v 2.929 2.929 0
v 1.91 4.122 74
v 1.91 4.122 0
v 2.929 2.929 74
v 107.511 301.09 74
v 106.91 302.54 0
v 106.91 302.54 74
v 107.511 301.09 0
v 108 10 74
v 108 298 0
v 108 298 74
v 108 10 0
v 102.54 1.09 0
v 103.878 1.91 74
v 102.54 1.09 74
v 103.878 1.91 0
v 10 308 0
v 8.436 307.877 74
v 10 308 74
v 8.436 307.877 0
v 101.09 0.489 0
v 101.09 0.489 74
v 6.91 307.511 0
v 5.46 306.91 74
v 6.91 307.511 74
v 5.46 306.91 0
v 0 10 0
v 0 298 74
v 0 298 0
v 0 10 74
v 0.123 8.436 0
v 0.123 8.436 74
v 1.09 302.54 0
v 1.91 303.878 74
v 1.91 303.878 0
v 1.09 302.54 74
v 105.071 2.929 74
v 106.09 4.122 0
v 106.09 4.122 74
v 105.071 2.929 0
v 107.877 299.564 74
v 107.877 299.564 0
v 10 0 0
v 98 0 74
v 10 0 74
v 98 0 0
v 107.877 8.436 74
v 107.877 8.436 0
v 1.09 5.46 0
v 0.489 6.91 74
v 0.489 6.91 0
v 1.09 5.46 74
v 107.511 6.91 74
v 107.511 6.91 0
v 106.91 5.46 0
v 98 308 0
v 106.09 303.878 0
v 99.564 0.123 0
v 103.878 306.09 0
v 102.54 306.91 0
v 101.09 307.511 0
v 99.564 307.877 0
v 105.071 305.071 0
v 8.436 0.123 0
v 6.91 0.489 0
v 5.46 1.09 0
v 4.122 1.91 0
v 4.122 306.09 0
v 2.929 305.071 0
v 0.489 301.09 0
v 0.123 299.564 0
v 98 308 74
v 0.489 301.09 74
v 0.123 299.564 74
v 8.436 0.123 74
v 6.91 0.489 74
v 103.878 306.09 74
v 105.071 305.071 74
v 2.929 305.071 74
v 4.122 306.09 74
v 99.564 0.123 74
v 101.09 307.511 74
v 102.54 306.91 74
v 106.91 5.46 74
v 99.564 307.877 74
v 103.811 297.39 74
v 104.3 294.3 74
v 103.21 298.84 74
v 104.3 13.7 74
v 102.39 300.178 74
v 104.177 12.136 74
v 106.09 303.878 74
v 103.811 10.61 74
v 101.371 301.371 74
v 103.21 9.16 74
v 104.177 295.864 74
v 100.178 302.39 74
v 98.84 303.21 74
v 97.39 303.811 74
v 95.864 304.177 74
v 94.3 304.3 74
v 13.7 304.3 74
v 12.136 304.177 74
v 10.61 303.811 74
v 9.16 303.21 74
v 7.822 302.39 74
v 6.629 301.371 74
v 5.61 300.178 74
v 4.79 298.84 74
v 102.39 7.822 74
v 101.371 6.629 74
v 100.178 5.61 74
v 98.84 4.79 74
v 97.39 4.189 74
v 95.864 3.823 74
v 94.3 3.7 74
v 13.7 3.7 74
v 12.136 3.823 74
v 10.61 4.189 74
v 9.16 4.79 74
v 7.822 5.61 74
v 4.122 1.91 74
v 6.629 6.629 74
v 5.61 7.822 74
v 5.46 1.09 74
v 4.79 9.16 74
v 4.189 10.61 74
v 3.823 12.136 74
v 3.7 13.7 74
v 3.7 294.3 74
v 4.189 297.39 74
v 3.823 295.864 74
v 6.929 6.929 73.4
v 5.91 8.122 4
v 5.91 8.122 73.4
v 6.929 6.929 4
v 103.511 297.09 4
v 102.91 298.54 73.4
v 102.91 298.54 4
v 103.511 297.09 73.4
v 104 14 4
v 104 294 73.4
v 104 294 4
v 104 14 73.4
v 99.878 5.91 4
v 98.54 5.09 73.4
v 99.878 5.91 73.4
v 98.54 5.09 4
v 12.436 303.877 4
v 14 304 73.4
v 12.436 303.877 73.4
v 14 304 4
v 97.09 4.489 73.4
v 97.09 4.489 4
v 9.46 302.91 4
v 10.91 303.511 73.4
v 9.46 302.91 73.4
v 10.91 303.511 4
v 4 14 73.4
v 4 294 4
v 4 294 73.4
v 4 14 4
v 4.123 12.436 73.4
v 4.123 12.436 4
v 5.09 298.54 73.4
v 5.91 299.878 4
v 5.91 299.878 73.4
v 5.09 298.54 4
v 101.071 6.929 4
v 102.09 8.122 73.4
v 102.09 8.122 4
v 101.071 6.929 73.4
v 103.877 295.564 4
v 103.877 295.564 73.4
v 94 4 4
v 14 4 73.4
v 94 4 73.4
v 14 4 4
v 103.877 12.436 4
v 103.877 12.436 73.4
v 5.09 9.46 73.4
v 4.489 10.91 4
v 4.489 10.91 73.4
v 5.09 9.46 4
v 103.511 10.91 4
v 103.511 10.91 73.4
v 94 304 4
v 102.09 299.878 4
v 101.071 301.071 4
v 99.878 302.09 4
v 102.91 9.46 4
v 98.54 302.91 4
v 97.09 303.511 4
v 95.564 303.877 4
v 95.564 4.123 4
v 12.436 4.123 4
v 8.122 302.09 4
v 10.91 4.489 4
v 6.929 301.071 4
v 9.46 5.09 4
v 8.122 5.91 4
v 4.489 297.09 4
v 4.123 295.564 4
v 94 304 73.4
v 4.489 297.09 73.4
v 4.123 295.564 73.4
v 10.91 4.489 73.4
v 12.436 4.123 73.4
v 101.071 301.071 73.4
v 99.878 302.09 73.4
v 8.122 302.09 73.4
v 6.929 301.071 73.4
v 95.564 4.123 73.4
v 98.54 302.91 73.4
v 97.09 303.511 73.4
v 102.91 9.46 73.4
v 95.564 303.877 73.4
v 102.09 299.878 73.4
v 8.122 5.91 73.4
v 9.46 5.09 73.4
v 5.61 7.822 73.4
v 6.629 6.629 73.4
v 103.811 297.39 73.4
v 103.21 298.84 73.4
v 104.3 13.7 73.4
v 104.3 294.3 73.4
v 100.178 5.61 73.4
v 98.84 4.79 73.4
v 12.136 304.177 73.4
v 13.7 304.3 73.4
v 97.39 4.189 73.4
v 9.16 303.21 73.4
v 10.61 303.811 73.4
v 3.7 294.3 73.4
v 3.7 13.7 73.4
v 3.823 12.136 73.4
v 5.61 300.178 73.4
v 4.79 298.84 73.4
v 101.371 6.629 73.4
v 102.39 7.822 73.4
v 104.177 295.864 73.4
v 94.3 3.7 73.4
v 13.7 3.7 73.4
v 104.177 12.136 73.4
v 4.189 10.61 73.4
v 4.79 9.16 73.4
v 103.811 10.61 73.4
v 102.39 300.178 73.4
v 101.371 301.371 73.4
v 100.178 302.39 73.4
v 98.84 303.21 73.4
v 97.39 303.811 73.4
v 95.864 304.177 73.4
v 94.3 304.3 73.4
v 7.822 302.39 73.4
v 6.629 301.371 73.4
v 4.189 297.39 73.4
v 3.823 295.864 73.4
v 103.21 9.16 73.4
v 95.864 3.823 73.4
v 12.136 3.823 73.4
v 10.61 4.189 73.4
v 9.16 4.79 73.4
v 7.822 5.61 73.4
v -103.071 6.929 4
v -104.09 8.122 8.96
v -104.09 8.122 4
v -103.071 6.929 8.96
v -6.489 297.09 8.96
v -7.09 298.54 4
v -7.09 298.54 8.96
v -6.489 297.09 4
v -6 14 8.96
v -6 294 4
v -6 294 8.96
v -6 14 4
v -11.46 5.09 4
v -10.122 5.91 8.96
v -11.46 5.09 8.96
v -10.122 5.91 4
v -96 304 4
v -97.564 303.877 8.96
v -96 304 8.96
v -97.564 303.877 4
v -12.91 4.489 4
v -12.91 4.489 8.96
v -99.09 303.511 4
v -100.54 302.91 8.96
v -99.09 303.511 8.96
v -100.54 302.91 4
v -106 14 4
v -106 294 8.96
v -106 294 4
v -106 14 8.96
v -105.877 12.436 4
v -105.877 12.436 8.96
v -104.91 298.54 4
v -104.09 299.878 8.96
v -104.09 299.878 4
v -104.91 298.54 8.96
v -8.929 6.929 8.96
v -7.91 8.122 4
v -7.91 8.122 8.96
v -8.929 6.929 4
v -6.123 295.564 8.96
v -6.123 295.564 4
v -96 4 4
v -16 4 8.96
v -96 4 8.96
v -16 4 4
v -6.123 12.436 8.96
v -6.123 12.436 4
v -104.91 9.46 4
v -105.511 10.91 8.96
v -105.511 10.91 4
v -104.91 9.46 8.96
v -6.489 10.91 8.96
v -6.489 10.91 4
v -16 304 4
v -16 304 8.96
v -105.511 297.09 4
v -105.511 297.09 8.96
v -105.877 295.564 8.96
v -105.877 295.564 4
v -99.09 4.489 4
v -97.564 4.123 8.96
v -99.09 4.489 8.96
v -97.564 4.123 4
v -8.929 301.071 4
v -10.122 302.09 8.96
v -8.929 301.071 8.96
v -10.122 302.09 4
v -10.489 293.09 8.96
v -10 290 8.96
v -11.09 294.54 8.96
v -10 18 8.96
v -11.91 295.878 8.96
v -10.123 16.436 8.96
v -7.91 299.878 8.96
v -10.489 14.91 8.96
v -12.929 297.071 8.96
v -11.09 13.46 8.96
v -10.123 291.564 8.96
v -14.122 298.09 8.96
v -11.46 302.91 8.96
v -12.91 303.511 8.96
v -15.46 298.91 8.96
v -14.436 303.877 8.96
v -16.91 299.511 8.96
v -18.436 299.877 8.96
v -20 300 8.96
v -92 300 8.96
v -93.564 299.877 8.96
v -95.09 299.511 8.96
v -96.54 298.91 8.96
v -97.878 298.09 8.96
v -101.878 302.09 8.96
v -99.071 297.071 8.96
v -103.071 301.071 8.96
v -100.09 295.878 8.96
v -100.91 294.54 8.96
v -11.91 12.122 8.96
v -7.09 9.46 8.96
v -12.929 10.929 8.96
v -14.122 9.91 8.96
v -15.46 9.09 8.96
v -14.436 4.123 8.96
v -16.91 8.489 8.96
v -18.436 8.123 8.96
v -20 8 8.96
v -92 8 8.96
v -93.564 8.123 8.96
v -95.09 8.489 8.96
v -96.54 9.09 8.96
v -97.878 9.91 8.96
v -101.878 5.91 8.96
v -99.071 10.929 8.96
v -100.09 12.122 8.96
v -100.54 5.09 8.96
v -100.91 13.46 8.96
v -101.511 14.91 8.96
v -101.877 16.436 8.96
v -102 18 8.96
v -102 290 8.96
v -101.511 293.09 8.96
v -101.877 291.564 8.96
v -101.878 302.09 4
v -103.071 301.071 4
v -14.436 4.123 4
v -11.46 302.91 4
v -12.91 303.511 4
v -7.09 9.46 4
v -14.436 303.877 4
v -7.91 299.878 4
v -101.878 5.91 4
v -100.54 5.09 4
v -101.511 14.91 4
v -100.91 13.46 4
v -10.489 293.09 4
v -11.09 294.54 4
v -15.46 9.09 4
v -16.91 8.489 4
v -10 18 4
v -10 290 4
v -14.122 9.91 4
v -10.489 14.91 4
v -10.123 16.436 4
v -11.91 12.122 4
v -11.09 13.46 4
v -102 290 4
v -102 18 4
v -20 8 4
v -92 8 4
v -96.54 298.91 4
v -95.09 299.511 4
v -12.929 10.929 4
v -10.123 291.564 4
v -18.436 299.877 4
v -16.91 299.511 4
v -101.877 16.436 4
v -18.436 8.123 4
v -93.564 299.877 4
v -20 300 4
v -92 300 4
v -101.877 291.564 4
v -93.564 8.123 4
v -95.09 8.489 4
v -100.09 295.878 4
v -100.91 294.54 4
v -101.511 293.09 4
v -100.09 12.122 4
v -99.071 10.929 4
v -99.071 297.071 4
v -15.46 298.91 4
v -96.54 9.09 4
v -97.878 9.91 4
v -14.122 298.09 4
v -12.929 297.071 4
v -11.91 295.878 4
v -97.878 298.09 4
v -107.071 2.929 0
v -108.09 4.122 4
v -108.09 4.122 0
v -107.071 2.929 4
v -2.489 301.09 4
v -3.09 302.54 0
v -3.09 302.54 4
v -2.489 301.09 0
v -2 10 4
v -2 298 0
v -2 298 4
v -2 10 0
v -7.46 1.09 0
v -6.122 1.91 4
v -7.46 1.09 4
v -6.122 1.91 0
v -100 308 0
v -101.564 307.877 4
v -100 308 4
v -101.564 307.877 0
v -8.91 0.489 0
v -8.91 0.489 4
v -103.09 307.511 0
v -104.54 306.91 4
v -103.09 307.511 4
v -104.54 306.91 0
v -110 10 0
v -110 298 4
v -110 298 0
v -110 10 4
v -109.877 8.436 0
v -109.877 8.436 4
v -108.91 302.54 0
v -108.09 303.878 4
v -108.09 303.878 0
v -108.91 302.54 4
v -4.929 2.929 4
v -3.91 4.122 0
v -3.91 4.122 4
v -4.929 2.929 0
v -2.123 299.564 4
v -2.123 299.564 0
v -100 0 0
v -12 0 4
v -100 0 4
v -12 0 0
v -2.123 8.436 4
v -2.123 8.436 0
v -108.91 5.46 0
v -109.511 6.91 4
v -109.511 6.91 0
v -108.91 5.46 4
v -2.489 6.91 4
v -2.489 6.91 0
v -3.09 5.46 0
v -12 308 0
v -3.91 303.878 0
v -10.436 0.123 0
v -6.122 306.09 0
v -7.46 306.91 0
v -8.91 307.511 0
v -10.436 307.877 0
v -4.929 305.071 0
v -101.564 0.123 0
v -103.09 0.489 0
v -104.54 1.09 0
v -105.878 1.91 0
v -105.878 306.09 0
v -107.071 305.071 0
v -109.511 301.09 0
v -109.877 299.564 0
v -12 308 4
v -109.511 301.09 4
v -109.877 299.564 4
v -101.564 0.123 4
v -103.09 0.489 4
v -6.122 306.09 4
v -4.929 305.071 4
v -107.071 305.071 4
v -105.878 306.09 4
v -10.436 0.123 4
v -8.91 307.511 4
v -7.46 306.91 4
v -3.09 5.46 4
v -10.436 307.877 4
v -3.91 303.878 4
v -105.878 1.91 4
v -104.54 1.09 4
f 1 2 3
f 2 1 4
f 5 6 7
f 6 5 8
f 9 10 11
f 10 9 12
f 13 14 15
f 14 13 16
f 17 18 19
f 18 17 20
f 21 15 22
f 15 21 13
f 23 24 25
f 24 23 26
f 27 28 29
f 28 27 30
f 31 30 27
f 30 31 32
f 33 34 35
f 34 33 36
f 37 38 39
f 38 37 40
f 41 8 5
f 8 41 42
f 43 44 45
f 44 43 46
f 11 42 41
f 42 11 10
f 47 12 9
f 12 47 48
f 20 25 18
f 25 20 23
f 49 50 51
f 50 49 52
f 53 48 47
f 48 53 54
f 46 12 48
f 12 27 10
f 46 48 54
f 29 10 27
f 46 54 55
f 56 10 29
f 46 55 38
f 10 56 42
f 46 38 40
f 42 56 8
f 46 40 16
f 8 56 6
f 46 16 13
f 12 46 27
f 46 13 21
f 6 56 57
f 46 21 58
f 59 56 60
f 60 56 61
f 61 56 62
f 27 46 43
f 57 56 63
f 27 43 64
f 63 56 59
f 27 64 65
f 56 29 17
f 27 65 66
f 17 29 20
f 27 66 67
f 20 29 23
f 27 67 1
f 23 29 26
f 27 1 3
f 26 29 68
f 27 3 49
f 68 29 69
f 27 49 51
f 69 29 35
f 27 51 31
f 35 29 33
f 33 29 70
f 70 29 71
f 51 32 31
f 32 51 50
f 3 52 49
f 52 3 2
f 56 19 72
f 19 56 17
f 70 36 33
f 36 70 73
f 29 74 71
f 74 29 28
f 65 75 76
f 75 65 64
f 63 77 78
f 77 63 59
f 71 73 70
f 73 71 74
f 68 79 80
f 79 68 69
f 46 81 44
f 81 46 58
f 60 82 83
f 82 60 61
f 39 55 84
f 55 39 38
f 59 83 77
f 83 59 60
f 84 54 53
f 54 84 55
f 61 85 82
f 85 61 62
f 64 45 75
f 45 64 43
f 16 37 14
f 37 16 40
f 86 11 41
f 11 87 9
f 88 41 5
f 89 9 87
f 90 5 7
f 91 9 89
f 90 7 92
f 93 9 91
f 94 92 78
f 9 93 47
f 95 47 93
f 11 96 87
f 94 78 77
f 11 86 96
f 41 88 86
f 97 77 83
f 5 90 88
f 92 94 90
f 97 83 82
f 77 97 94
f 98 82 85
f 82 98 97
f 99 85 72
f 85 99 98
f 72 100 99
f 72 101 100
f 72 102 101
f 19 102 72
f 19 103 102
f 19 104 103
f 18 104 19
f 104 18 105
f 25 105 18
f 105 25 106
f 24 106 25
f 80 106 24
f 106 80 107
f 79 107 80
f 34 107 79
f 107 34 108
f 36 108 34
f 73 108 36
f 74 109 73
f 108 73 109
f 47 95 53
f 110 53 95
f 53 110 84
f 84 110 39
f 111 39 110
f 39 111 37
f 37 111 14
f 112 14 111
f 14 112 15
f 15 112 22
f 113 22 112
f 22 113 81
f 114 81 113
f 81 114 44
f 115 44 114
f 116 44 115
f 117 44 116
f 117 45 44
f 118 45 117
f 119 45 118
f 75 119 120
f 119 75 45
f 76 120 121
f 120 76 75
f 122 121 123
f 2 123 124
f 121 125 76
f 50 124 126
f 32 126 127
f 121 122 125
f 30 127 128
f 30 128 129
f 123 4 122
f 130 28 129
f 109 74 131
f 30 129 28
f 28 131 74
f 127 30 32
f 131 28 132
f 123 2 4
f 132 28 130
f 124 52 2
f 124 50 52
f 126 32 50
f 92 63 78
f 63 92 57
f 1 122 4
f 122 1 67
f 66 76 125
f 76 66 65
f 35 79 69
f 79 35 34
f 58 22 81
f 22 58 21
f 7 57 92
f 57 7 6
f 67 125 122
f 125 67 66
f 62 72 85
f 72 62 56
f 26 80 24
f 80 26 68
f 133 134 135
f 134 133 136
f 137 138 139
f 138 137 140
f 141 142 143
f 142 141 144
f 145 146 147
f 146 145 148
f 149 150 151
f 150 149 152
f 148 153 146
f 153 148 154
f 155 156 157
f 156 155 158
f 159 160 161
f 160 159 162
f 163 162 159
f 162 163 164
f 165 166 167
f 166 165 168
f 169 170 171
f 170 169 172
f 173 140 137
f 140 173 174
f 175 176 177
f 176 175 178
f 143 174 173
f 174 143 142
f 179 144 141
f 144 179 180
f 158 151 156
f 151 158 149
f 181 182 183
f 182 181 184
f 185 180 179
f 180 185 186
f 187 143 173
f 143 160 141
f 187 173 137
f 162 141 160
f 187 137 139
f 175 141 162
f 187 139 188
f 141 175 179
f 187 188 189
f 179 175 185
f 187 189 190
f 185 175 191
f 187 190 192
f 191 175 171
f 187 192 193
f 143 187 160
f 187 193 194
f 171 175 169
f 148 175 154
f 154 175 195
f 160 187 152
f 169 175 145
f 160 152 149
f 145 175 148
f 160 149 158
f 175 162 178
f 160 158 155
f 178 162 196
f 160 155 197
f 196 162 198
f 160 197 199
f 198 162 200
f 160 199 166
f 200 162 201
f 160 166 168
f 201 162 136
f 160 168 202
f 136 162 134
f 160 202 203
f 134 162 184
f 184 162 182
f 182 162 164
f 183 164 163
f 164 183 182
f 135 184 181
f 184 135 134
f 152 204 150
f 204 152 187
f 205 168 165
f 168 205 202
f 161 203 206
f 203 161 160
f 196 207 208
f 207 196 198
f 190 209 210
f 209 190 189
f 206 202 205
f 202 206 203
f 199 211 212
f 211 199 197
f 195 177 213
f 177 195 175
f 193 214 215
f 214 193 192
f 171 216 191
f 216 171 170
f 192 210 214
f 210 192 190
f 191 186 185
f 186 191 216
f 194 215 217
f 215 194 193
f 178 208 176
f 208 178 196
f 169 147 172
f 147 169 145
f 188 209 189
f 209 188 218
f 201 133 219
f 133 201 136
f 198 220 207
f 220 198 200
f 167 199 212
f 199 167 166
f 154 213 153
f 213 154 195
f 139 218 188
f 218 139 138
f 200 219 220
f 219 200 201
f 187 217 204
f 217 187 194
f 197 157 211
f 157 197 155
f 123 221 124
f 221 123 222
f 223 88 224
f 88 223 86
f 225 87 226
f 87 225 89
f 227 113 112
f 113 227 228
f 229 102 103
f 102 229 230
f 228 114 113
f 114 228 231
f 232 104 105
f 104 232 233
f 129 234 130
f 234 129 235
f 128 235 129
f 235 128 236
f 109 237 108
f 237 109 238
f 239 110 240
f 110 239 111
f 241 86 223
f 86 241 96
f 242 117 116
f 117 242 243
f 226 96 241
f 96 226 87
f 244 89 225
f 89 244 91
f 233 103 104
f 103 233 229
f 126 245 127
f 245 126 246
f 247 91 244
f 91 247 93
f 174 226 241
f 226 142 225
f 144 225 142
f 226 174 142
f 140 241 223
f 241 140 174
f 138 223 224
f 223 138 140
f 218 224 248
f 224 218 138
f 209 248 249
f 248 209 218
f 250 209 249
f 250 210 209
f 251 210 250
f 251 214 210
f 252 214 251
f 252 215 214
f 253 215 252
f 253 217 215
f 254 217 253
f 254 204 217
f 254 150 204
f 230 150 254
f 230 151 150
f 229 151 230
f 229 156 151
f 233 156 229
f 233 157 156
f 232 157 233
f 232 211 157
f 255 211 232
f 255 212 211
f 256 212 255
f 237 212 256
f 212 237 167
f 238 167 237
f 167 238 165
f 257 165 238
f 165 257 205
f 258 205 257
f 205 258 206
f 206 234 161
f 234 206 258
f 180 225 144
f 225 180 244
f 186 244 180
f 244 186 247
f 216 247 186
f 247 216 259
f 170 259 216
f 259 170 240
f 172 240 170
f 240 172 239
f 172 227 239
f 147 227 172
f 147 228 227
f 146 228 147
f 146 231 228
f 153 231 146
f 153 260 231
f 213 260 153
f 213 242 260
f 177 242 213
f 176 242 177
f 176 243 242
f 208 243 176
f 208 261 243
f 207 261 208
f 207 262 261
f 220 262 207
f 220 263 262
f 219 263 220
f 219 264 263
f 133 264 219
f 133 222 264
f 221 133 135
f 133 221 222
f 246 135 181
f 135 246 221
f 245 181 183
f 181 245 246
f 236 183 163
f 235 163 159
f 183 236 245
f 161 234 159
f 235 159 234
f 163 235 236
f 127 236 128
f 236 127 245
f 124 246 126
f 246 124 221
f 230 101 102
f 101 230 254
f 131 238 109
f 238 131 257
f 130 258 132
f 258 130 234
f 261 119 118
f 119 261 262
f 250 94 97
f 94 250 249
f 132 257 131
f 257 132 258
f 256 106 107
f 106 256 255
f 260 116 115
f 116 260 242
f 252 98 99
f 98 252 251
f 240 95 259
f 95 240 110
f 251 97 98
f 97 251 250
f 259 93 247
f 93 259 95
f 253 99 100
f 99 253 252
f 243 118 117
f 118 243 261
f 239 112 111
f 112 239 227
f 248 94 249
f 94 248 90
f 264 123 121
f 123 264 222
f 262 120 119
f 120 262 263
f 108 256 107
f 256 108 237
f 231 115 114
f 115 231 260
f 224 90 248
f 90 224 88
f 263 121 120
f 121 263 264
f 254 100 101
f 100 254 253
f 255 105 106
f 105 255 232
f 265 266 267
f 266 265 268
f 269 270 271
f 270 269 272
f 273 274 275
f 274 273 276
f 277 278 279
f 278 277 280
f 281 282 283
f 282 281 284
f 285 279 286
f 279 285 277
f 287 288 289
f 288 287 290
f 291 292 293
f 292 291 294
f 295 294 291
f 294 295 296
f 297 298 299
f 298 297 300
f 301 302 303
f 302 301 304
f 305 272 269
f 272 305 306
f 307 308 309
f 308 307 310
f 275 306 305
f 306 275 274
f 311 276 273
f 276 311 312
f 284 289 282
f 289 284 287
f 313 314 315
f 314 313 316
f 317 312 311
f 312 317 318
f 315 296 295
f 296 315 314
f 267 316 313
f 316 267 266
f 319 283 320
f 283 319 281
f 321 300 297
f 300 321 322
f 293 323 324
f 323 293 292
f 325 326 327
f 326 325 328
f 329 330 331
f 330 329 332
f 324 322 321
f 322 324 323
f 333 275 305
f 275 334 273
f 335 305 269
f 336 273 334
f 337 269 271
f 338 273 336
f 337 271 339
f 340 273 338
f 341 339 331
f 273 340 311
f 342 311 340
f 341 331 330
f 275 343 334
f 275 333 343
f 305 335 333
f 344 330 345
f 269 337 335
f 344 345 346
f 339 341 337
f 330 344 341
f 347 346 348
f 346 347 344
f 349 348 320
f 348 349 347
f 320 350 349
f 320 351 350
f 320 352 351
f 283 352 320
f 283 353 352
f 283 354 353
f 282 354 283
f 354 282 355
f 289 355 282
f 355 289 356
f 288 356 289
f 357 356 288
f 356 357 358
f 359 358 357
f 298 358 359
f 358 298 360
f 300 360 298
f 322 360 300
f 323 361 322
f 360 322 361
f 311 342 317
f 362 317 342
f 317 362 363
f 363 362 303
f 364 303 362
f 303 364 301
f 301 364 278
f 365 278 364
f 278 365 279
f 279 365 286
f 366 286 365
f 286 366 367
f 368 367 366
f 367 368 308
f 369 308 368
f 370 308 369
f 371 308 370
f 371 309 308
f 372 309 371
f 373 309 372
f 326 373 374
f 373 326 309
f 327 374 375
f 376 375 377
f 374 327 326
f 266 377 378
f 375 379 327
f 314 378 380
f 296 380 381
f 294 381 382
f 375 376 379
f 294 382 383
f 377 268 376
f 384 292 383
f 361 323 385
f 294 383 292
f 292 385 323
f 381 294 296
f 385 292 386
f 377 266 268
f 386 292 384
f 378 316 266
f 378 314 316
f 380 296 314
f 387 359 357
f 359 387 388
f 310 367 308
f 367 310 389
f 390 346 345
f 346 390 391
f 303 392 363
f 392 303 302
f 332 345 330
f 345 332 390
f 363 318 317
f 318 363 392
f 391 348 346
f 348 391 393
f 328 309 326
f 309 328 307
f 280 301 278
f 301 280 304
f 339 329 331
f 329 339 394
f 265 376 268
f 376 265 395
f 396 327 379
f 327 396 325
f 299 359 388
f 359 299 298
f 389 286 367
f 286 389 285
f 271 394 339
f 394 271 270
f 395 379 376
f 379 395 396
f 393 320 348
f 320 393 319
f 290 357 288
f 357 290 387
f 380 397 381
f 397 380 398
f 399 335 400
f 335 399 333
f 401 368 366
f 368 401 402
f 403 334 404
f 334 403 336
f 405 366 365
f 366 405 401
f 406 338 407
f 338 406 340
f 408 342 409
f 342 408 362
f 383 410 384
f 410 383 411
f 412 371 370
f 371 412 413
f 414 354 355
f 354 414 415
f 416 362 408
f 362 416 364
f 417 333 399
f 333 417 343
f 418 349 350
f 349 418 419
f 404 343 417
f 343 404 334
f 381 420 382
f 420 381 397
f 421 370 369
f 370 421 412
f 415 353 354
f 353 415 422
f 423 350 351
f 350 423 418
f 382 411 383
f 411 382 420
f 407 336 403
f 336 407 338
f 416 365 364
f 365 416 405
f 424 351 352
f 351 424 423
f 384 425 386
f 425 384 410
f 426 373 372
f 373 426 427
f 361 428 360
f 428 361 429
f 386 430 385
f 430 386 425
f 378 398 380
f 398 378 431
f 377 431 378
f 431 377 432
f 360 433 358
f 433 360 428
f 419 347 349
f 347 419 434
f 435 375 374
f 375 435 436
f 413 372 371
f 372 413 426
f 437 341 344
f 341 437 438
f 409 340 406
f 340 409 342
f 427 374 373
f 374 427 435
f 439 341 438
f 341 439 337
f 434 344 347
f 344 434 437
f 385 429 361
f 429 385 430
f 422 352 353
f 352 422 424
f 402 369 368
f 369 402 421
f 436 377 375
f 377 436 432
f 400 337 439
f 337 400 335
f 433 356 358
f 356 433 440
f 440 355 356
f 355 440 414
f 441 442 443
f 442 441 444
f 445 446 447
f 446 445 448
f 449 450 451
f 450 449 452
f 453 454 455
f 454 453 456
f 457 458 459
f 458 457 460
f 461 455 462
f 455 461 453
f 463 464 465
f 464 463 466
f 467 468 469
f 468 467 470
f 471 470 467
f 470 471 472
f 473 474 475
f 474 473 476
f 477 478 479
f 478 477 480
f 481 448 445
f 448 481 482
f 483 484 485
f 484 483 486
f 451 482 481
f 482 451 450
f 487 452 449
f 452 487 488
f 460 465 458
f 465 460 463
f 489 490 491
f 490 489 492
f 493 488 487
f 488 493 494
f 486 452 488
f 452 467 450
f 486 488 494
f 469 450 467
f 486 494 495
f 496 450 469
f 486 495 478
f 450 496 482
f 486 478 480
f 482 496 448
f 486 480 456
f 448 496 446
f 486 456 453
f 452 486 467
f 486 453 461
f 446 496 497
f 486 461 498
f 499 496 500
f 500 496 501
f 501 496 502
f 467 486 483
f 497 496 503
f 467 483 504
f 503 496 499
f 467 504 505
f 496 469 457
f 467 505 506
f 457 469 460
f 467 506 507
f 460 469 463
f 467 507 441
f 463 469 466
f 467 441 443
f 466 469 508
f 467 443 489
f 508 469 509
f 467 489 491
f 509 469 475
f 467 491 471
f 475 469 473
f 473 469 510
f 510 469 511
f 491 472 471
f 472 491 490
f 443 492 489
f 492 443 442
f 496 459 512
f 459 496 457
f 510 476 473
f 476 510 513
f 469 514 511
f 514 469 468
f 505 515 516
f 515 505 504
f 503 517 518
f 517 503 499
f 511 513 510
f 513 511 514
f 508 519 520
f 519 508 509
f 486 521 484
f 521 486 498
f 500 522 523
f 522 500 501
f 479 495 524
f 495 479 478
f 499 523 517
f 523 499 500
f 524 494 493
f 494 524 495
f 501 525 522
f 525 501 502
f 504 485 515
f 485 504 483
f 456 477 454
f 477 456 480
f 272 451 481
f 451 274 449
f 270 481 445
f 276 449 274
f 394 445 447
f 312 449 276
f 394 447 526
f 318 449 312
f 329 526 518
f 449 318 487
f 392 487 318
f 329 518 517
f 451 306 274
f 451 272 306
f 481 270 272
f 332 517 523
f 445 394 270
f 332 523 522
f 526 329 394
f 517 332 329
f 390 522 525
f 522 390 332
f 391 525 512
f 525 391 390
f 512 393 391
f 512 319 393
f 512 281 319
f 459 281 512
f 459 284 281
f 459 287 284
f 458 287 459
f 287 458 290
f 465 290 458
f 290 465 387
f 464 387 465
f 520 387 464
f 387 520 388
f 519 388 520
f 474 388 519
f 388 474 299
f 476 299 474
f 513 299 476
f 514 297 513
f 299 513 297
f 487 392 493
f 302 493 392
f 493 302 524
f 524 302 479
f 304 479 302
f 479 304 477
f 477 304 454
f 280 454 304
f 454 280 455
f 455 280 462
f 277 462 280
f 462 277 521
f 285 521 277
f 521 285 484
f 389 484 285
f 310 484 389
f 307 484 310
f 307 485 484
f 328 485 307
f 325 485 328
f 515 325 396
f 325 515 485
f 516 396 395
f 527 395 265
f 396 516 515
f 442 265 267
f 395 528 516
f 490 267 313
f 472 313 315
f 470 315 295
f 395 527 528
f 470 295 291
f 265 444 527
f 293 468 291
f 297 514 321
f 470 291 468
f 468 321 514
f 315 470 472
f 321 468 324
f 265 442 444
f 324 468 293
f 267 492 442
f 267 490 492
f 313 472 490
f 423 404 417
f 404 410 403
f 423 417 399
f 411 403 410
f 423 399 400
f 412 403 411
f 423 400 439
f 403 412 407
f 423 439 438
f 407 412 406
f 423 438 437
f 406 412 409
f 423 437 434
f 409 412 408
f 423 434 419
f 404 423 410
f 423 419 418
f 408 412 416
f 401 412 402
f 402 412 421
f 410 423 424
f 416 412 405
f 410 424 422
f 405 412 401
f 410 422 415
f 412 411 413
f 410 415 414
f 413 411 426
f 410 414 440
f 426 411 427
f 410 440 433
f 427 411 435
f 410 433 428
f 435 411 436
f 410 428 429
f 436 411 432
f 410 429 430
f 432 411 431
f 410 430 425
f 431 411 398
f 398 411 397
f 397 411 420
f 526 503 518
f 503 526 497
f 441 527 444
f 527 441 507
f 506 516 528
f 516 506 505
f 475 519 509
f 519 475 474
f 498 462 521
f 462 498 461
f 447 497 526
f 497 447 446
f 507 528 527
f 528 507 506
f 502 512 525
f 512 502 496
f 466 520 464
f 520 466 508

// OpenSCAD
// 0=none (library mode), 1=main box, 2=lid, 3=both
mode=3;

inside_width = 100;
inside_length = 300;
inside_height = 70;
wall_thickness = 4;                  
// must be less than half inside_width and inside_length 
corner_radius = 10;

// thickness of the top of the lid
lid_thickness = 4;
// depth of the internal ledge that fit in the box
lid_ledge_depth = 5;
// set this to a positive value if your printed lid is too big for the box, negative value if it is too loose
lid_lip_tolerance = 0; // 0.3;

// Holes
// 0=disable holes, 1=enable holes
lid_holes = 0;
// 0=disable holes, 1=enable holes
left_holes = 0;
// 0=disable holes, 1=enable holes
right_holes = 0;
// 0=disable holes, 1=enable holes
bottom_holes = 0;

lid_hole_side_offset = 30;
left_hole_side_offset = 15;
right_hole_side_offset = 15;
bottom_hole_side_offset = 20;

hole_separation = 12;
hole_diameter = 6;
// 0=aligned holes, 1=alternate holes
hole_alternate_shift = 0;

outside_width = inside_width + wall_thickness * 2;
outside_length = inside_length + wall_thickness * 2;

module rounded_box(x,y,z,r){
    translate([r, r, 0]) {
        linear_extrude(z) {
            minkowski(){
                square([x-r*2,y-r*2]);
                if(r > 0)
                    circle(r, $fn=max(40, 4*corner_radius));
            }
        }
    }
}

module cylinder_array(width, length, height, offset) {
    hole_count_x = round((width-hole_separation-offset) / hole_separation)+1;
    hole_count_y = round((length-hole_separation-offset) / hole_separation)+1;
    //echo ([hole_count_x, hole_count_y]);
    
    hole_area_width = (hole_count_x-1) * (hole_separation);
    hole_area_length = (hole_count_y-1) * (hole_separation) + (hole_alternate_shift ? hole_separation/2 : 0);

    translate ([(width-hole_area_width)/2, (length-hole_area_length)/2, -height*0.1]) {
        //create holes
        for (i=[0:hole_count_x-1]) {
            //echo(i*hole_separation);
            for (j=[0:hole_count_y-1]) {
                translate ([i*hole_separation, j*hole_separation+(hole_alternate_shift ? hole_separation/2*(i%2) : 0), 0]) {
                    cylinder(height*1.2, hole_diameter/2, hole_diameter/2, $fn=40, false);
                }
            }
        }
    }
}

module main_box(){
    difference() {
        rounded_box(outside_width, outside_length, inside_height + wall_thickness, corner_radius);

        translate([wall_thickness, wall_thickness, wall_thickness]) {
            rounded_box(inside_width, inside_length, inside_height + wall_thickness*1.2, corner_radius);
        }

        // Edge to compensate printing inaccuracies on lid lip's base
        translate([wall_thickness-0.3, wall_thickness-0.3, inside_height+wall_thickness-0.6]) {
            color([0.8, 0.2, 0.2]) {
                rounded_box(inside_width+0.6, inside_length+0.6, 1, corner_radius);
            }
        }
        
        if(bottom_holes)
            cylinder_array(outside_width, outside_length, wall_thickness, bottom_hole_side_offset);
    
        rotate([0, 90, 0]) {
            if(left_holes) {
                translate([-inside_height-wall_thickness, wall_thickness, 0]) {
                    cylinder_array(inside_height, inside_length, wall_thickness, left_hole_side_offset);
                }
            }
            if(right_holes) {
                translate([-inside_height-wall_thickness, wall_thickness, inside_width+wall_thickness]) {
                    cylinder_array(inside_height, inside_length, wall_thickness, right_hole_side_offset);
                }
            }
        }
    }
}

module lid() {
    union() {
        difference() {
            //Lid
            rounded_box(outside_width, outside_length, lid_thickness, corner_radius);
        
            if(lid_holes) {
                cylinder_array(outside_width, outside_length, lid_thickness, lid_hole_side_offset);
            }
        }
        
        //Lip
        lip_width = inside_width - lid_lip_tolerance;
        lip_length = inside_length - lid_lip_tolerance;
        translate([(outside_width - lip_width)/2,(outside_length - lip_length)/2, lid_thickness * 0.99]) {
            difference(){
                color([0.2, 0.8, 0.2]) {
                    rounded_box(lip_width, lip_length, lid_ledge_depth, corner_radius);
                }
                translate([wall_thickness, wall_thickness, -lid_ledge_depth*0.1]) {
                    rounded_box(lip_width-wall_thickness*2, lip_length-wall_thickness*2, lid_ledge_depth*1.2, corner_radius);
                }
            }
        }
    }
}

module assembly () {
    main_box();
    translate([-outside_width-2,0,0]) {
        lid();
    }
}

if (mode == 1) {
    main_box();
} else if (mode == 2) {
    lid();
} else if (mode == 3) {
     assembly();
}
